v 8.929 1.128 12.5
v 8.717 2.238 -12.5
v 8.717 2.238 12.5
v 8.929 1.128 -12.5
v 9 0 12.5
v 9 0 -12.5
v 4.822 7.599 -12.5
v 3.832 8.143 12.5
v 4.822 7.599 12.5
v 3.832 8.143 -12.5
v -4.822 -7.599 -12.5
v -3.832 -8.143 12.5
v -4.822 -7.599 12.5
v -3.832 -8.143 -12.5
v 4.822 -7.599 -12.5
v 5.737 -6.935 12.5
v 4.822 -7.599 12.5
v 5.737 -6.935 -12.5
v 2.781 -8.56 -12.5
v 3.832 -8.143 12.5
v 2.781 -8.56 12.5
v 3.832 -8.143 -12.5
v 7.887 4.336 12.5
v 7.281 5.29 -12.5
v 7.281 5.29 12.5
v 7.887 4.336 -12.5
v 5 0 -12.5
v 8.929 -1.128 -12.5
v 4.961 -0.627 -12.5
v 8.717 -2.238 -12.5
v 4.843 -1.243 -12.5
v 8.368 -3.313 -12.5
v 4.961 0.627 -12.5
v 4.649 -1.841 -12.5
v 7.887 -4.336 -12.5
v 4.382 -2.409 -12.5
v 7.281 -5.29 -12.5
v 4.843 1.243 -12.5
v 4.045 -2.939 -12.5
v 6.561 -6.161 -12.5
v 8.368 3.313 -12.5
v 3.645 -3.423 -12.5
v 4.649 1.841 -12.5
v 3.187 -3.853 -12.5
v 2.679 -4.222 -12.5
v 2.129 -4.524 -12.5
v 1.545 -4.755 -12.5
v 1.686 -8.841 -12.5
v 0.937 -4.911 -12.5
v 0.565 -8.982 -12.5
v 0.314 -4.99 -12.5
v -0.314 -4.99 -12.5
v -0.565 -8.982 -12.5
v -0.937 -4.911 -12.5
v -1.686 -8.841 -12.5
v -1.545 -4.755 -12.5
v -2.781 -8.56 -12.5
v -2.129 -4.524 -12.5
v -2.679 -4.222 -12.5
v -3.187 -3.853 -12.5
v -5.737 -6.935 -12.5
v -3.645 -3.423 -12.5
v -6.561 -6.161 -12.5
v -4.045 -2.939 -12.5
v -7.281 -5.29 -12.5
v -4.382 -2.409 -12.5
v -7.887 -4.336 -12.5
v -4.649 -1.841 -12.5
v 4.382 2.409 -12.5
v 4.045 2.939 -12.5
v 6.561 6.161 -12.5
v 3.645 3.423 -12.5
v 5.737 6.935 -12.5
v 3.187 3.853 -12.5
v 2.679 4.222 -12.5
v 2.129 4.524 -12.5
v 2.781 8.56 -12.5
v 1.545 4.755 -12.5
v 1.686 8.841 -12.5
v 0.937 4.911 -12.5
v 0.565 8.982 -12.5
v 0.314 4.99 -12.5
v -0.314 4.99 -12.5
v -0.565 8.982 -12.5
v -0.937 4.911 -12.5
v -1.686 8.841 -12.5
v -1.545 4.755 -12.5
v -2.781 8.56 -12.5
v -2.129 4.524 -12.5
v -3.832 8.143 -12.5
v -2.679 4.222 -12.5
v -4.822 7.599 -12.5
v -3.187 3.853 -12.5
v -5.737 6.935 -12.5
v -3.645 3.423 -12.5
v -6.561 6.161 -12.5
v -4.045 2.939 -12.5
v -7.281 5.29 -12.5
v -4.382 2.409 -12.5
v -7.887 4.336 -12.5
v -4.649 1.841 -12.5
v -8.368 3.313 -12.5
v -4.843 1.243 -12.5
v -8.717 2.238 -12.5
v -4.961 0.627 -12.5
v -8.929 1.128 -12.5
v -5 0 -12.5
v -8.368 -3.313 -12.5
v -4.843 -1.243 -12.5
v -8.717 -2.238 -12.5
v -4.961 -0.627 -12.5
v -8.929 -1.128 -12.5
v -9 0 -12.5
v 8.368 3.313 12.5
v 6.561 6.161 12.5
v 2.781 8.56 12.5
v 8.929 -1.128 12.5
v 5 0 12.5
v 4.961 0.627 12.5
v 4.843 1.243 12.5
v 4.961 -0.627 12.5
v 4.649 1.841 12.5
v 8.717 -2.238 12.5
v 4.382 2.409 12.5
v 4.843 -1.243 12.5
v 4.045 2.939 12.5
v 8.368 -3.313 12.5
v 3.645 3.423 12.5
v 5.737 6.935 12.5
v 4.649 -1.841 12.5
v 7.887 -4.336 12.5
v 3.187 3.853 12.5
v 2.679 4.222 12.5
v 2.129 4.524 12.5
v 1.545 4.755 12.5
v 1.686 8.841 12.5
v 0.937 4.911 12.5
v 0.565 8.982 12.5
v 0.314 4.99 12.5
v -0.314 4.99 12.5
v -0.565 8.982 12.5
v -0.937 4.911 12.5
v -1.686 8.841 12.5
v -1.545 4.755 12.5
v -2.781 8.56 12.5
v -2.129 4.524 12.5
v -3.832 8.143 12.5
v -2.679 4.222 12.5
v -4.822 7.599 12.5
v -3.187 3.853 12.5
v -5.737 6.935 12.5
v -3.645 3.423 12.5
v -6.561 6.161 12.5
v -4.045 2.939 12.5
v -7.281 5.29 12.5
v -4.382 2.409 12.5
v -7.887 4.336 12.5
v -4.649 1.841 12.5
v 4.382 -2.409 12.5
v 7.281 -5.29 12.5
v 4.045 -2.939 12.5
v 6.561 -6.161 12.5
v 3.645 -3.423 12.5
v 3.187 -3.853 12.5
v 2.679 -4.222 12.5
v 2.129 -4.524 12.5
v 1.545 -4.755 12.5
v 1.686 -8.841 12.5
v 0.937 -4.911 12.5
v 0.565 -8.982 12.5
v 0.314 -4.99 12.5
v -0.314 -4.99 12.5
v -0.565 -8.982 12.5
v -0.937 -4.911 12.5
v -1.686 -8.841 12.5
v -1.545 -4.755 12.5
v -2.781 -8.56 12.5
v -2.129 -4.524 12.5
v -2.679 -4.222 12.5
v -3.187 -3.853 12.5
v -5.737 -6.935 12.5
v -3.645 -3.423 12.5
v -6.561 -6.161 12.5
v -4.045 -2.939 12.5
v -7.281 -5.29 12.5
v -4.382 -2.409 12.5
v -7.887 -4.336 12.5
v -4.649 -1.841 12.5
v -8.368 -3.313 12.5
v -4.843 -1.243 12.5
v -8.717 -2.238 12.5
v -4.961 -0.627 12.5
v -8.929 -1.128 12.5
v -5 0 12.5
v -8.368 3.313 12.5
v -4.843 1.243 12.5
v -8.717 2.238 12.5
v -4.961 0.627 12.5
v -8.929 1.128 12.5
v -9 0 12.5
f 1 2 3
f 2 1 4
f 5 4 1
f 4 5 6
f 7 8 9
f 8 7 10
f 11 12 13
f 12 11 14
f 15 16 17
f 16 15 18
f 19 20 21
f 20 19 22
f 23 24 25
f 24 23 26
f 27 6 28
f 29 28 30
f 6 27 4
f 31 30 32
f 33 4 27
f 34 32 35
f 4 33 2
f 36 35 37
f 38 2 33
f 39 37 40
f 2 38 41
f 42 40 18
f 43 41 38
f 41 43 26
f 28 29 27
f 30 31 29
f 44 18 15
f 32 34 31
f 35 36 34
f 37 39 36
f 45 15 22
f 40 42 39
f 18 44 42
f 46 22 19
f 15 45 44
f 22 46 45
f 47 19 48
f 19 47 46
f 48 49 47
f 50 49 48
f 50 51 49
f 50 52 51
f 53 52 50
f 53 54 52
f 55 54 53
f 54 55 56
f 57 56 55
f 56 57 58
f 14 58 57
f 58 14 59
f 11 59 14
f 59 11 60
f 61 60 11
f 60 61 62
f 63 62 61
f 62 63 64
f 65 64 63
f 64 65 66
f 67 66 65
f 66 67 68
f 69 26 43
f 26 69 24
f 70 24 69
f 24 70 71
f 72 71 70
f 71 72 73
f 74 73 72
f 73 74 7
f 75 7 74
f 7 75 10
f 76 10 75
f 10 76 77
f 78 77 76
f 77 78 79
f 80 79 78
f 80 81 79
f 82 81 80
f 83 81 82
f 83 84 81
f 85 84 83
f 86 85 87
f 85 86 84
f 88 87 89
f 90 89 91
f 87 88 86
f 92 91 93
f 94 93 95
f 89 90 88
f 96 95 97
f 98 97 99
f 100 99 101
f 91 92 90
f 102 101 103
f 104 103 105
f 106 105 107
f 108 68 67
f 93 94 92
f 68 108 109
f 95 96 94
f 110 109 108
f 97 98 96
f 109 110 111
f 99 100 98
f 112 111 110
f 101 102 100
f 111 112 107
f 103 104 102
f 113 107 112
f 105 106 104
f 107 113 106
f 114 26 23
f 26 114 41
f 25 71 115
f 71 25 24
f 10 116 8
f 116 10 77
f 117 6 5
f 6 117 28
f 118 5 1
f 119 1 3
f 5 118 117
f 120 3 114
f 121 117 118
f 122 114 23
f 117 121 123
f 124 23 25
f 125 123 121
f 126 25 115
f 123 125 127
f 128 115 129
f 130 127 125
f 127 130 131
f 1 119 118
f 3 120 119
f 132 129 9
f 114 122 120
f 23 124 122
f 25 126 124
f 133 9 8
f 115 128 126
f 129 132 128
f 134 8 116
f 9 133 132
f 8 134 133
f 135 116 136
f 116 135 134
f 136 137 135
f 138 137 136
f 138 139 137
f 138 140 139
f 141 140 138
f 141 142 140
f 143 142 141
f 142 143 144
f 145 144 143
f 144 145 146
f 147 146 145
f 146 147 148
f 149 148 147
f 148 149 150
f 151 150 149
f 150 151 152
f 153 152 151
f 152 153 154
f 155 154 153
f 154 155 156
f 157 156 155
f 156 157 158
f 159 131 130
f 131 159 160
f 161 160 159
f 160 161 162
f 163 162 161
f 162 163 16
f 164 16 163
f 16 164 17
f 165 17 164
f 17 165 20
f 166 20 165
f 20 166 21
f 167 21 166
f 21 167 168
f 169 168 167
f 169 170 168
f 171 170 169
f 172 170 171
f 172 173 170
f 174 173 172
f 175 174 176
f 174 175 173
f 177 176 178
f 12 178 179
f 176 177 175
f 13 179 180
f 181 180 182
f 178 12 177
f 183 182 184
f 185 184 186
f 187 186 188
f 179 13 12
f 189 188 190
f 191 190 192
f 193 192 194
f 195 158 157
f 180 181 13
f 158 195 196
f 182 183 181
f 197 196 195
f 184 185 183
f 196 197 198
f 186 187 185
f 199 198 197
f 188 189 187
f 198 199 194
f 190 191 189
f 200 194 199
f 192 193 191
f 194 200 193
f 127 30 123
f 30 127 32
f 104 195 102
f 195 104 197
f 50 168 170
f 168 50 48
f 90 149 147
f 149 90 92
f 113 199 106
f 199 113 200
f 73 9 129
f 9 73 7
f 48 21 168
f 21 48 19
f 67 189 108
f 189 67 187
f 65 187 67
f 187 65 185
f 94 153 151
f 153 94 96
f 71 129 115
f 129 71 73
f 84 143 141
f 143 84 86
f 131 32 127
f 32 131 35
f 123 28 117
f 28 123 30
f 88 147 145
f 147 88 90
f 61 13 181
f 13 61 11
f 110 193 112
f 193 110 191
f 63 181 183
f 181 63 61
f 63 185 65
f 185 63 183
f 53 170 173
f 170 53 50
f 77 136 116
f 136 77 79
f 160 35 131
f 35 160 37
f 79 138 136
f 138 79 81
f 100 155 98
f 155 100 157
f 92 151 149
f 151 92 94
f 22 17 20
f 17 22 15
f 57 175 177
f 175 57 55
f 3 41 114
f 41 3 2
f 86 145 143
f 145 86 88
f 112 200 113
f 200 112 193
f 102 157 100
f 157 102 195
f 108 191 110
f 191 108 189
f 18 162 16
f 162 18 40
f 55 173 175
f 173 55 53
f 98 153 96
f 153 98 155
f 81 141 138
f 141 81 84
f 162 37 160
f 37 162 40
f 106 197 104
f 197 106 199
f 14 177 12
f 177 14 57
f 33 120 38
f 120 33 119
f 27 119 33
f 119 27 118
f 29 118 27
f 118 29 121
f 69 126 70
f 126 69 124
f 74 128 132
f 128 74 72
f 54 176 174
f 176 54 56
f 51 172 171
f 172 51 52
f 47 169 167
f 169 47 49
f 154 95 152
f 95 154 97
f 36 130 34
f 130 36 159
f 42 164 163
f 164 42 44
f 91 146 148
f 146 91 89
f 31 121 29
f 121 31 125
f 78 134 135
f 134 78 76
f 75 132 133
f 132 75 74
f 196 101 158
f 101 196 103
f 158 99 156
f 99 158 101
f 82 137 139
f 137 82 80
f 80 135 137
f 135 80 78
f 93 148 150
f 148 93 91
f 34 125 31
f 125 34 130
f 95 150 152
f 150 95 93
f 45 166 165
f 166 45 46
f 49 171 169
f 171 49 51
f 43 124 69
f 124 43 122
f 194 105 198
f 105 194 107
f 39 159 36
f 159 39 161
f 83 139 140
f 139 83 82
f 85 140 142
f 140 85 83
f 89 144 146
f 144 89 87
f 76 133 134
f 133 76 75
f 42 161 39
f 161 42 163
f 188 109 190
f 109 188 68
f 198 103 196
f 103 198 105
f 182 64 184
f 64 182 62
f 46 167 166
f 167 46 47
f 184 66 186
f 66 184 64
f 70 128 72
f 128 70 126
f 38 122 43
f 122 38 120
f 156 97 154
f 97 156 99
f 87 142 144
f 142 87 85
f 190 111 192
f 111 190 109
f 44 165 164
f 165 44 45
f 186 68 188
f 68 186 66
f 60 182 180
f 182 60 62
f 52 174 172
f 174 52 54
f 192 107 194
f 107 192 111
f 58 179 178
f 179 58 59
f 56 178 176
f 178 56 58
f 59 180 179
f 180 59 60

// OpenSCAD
$fn = 50;


difference() {
	union() {
		translate(v = [0, 0, -12.5000000000]) {
			cylinder(h = 25, r = 9.0000000000);
		}
	}
	union() {
		translate(v = [0, 0, -100.0000000000]) {
			cylinder(h = 200, r = 5.0000000000);
		}
	}
}
